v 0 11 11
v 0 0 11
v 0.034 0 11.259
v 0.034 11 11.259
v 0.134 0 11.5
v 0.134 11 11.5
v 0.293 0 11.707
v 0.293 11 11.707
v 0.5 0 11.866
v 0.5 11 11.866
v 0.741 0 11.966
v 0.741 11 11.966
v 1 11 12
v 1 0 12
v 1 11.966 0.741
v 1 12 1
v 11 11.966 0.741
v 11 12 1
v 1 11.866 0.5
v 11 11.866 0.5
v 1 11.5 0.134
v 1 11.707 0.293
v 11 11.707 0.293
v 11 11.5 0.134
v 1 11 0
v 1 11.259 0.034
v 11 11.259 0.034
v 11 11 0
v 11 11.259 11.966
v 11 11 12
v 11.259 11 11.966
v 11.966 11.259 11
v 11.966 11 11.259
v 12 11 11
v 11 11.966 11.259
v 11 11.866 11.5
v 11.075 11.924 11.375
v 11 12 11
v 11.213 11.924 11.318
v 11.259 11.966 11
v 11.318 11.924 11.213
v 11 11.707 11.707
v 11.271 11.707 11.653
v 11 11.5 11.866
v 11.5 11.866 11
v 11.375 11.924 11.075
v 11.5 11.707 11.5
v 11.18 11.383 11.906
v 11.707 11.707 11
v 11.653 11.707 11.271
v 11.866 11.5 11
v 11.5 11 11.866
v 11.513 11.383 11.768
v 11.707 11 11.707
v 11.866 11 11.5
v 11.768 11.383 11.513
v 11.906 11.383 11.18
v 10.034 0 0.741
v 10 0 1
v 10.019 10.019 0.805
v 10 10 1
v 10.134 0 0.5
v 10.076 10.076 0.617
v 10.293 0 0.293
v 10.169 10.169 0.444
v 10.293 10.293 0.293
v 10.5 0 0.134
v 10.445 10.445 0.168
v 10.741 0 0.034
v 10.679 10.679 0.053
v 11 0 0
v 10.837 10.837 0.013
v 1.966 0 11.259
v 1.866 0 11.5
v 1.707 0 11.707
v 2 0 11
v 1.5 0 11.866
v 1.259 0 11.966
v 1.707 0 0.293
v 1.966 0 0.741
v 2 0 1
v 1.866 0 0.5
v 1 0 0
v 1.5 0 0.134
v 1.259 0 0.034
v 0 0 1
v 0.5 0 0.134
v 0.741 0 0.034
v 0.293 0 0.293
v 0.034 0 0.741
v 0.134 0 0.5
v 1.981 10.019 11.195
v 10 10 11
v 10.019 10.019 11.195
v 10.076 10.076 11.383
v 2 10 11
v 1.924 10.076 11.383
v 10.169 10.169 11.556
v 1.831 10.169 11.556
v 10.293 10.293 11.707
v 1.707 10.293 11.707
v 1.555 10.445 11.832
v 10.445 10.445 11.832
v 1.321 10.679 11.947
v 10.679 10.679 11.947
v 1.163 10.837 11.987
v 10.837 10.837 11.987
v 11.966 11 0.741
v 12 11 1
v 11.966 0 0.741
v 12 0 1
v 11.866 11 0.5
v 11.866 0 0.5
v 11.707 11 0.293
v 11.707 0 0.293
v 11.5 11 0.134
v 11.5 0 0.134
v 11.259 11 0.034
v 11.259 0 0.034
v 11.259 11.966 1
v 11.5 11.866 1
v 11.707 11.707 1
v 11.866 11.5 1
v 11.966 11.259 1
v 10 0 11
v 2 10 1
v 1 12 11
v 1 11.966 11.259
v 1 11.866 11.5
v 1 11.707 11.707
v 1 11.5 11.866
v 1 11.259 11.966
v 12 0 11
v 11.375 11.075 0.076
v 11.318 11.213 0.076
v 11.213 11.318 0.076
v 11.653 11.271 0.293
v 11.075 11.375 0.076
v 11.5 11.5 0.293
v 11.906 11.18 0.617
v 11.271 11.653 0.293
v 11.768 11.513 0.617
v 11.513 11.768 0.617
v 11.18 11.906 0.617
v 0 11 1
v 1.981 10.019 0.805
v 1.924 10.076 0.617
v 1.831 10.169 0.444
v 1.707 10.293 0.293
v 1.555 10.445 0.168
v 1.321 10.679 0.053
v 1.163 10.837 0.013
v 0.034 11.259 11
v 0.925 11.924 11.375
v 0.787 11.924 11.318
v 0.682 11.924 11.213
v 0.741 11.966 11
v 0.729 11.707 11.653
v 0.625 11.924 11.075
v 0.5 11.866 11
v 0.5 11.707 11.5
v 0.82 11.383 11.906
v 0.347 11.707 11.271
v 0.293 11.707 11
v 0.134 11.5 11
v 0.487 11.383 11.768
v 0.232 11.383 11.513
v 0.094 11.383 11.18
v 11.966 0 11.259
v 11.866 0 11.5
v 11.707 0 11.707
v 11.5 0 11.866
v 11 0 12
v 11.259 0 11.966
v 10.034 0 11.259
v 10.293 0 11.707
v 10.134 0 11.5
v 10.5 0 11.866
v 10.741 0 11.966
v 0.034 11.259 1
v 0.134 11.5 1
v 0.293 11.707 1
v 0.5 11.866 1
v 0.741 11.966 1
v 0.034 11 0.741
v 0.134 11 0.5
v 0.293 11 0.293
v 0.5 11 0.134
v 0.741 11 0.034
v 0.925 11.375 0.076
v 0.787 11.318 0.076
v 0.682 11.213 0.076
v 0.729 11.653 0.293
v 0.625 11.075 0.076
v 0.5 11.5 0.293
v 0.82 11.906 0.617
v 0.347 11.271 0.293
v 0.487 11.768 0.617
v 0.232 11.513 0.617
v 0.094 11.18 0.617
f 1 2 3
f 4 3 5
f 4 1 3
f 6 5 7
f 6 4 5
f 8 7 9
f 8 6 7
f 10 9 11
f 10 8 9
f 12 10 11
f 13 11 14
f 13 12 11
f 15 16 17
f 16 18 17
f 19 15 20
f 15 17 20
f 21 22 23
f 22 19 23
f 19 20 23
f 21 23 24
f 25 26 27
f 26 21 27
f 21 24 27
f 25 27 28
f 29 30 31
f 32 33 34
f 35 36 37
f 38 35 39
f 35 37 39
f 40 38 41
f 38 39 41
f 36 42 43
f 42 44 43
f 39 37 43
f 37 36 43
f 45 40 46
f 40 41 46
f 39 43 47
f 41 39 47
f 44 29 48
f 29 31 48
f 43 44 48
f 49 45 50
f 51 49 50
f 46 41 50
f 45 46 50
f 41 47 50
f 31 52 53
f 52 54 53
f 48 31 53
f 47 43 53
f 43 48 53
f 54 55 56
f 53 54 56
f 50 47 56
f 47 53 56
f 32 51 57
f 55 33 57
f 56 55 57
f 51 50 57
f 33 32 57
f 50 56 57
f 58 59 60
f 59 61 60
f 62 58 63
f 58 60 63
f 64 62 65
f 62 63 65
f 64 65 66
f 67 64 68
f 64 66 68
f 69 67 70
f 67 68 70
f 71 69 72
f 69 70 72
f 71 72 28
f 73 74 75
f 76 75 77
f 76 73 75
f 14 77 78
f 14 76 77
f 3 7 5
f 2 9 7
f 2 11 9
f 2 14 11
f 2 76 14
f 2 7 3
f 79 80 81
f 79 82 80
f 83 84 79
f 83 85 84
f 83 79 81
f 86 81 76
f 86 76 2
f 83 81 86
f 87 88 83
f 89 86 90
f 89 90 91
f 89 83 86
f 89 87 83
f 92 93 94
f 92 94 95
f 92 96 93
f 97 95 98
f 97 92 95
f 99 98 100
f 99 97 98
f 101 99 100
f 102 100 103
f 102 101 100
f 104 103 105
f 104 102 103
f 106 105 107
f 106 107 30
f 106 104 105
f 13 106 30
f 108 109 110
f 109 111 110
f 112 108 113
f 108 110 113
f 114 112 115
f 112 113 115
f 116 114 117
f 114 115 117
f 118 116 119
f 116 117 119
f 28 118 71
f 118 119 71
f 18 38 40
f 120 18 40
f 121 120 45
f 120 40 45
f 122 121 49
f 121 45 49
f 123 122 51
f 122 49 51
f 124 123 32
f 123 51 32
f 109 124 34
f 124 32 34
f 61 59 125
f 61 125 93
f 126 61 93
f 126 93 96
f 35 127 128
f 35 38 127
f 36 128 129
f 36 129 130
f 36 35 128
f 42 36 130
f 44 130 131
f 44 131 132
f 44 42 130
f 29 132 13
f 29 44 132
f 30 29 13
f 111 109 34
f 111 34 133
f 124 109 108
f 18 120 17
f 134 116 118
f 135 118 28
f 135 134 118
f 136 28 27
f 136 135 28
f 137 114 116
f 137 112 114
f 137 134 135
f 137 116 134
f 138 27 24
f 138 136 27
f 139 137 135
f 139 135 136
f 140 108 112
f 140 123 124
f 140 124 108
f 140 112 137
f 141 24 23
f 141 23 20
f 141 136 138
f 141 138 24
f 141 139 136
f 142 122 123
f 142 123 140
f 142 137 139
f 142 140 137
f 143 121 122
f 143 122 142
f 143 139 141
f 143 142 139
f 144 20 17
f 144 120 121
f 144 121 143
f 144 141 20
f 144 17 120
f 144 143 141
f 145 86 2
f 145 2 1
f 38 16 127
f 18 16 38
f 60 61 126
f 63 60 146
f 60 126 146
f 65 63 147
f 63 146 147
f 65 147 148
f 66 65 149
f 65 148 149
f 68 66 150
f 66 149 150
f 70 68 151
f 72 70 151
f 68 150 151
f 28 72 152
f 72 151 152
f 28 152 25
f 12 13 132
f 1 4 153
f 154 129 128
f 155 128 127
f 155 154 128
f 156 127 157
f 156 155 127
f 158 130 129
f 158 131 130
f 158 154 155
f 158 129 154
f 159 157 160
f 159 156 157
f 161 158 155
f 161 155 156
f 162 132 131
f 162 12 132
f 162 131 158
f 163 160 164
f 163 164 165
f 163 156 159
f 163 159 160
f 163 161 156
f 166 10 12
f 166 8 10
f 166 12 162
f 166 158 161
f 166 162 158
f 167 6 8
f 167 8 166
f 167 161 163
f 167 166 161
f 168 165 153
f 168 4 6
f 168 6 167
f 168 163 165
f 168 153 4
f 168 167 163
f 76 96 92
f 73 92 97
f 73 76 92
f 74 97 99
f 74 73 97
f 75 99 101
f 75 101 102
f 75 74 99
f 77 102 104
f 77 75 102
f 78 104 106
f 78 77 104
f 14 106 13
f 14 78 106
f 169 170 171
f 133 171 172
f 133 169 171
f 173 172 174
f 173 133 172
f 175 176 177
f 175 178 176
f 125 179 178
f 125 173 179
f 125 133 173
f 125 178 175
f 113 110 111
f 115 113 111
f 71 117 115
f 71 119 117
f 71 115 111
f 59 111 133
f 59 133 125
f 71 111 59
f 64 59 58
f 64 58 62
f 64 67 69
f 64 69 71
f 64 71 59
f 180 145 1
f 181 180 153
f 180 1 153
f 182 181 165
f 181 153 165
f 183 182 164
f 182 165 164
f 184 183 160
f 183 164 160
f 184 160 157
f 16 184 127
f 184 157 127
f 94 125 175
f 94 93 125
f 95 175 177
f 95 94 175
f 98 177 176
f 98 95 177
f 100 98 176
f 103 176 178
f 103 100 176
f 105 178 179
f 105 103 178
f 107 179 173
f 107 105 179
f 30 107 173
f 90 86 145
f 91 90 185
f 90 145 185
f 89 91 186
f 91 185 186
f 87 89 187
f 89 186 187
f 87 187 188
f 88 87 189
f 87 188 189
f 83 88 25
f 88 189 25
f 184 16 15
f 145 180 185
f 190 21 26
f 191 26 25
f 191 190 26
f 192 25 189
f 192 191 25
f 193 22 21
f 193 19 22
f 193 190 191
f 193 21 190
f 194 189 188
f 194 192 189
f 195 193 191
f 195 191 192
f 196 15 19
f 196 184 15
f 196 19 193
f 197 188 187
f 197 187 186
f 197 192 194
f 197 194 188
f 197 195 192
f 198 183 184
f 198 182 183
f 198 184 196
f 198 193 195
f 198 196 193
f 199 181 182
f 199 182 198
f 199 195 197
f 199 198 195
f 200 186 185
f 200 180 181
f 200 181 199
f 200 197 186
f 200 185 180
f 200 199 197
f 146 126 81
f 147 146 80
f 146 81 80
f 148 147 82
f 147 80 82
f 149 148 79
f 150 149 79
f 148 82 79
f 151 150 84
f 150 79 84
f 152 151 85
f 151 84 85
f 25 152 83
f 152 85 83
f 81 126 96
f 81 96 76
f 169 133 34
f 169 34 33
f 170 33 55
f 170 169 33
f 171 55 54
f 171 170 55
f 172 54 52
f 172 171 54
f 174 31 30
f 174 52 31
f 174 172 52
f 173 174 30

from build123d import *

# Parameters (mm, degrees)
BOSS_EXTRUDE1_DEPTH = 12
FILLET3_R           = 1


with BuildPart() as part:
    # Sketch1 → Boss-Extrude1 (new body)
    with BuildSketch(Plane.XY):
        Polygon((0, 0), (0, 12), (12, 12), (12, 0), (10, 0), (10, 10), (2, 10), (2, 0), align=None)
    extrude(amount=BOSS_EXTRUDE1_DEPTH)

    # Fillet3
    fillet3_edges = [part.edges().sort_by_distance(p)[0] for p in [
        (2, 5, 12),
        (0, 6, 12),
        (12, 6, 12),
        (10, 5, 12),
        (6, 10, 12),
        (6, 12, 12),
        (0, 12, 6),
        (12, 12, 6),
        (12, 6, 0),
        (6, 12, 0),
        (0, 6, 0),
        (10, 5, 0),
        (6, 10, 0),
        (2, 5, 0),
    ]]
    fillet(fillet3_edges, radius=FILLET3_R - 0.0001)  # a hair under: the kernel refuses the full size


solid = part.part
